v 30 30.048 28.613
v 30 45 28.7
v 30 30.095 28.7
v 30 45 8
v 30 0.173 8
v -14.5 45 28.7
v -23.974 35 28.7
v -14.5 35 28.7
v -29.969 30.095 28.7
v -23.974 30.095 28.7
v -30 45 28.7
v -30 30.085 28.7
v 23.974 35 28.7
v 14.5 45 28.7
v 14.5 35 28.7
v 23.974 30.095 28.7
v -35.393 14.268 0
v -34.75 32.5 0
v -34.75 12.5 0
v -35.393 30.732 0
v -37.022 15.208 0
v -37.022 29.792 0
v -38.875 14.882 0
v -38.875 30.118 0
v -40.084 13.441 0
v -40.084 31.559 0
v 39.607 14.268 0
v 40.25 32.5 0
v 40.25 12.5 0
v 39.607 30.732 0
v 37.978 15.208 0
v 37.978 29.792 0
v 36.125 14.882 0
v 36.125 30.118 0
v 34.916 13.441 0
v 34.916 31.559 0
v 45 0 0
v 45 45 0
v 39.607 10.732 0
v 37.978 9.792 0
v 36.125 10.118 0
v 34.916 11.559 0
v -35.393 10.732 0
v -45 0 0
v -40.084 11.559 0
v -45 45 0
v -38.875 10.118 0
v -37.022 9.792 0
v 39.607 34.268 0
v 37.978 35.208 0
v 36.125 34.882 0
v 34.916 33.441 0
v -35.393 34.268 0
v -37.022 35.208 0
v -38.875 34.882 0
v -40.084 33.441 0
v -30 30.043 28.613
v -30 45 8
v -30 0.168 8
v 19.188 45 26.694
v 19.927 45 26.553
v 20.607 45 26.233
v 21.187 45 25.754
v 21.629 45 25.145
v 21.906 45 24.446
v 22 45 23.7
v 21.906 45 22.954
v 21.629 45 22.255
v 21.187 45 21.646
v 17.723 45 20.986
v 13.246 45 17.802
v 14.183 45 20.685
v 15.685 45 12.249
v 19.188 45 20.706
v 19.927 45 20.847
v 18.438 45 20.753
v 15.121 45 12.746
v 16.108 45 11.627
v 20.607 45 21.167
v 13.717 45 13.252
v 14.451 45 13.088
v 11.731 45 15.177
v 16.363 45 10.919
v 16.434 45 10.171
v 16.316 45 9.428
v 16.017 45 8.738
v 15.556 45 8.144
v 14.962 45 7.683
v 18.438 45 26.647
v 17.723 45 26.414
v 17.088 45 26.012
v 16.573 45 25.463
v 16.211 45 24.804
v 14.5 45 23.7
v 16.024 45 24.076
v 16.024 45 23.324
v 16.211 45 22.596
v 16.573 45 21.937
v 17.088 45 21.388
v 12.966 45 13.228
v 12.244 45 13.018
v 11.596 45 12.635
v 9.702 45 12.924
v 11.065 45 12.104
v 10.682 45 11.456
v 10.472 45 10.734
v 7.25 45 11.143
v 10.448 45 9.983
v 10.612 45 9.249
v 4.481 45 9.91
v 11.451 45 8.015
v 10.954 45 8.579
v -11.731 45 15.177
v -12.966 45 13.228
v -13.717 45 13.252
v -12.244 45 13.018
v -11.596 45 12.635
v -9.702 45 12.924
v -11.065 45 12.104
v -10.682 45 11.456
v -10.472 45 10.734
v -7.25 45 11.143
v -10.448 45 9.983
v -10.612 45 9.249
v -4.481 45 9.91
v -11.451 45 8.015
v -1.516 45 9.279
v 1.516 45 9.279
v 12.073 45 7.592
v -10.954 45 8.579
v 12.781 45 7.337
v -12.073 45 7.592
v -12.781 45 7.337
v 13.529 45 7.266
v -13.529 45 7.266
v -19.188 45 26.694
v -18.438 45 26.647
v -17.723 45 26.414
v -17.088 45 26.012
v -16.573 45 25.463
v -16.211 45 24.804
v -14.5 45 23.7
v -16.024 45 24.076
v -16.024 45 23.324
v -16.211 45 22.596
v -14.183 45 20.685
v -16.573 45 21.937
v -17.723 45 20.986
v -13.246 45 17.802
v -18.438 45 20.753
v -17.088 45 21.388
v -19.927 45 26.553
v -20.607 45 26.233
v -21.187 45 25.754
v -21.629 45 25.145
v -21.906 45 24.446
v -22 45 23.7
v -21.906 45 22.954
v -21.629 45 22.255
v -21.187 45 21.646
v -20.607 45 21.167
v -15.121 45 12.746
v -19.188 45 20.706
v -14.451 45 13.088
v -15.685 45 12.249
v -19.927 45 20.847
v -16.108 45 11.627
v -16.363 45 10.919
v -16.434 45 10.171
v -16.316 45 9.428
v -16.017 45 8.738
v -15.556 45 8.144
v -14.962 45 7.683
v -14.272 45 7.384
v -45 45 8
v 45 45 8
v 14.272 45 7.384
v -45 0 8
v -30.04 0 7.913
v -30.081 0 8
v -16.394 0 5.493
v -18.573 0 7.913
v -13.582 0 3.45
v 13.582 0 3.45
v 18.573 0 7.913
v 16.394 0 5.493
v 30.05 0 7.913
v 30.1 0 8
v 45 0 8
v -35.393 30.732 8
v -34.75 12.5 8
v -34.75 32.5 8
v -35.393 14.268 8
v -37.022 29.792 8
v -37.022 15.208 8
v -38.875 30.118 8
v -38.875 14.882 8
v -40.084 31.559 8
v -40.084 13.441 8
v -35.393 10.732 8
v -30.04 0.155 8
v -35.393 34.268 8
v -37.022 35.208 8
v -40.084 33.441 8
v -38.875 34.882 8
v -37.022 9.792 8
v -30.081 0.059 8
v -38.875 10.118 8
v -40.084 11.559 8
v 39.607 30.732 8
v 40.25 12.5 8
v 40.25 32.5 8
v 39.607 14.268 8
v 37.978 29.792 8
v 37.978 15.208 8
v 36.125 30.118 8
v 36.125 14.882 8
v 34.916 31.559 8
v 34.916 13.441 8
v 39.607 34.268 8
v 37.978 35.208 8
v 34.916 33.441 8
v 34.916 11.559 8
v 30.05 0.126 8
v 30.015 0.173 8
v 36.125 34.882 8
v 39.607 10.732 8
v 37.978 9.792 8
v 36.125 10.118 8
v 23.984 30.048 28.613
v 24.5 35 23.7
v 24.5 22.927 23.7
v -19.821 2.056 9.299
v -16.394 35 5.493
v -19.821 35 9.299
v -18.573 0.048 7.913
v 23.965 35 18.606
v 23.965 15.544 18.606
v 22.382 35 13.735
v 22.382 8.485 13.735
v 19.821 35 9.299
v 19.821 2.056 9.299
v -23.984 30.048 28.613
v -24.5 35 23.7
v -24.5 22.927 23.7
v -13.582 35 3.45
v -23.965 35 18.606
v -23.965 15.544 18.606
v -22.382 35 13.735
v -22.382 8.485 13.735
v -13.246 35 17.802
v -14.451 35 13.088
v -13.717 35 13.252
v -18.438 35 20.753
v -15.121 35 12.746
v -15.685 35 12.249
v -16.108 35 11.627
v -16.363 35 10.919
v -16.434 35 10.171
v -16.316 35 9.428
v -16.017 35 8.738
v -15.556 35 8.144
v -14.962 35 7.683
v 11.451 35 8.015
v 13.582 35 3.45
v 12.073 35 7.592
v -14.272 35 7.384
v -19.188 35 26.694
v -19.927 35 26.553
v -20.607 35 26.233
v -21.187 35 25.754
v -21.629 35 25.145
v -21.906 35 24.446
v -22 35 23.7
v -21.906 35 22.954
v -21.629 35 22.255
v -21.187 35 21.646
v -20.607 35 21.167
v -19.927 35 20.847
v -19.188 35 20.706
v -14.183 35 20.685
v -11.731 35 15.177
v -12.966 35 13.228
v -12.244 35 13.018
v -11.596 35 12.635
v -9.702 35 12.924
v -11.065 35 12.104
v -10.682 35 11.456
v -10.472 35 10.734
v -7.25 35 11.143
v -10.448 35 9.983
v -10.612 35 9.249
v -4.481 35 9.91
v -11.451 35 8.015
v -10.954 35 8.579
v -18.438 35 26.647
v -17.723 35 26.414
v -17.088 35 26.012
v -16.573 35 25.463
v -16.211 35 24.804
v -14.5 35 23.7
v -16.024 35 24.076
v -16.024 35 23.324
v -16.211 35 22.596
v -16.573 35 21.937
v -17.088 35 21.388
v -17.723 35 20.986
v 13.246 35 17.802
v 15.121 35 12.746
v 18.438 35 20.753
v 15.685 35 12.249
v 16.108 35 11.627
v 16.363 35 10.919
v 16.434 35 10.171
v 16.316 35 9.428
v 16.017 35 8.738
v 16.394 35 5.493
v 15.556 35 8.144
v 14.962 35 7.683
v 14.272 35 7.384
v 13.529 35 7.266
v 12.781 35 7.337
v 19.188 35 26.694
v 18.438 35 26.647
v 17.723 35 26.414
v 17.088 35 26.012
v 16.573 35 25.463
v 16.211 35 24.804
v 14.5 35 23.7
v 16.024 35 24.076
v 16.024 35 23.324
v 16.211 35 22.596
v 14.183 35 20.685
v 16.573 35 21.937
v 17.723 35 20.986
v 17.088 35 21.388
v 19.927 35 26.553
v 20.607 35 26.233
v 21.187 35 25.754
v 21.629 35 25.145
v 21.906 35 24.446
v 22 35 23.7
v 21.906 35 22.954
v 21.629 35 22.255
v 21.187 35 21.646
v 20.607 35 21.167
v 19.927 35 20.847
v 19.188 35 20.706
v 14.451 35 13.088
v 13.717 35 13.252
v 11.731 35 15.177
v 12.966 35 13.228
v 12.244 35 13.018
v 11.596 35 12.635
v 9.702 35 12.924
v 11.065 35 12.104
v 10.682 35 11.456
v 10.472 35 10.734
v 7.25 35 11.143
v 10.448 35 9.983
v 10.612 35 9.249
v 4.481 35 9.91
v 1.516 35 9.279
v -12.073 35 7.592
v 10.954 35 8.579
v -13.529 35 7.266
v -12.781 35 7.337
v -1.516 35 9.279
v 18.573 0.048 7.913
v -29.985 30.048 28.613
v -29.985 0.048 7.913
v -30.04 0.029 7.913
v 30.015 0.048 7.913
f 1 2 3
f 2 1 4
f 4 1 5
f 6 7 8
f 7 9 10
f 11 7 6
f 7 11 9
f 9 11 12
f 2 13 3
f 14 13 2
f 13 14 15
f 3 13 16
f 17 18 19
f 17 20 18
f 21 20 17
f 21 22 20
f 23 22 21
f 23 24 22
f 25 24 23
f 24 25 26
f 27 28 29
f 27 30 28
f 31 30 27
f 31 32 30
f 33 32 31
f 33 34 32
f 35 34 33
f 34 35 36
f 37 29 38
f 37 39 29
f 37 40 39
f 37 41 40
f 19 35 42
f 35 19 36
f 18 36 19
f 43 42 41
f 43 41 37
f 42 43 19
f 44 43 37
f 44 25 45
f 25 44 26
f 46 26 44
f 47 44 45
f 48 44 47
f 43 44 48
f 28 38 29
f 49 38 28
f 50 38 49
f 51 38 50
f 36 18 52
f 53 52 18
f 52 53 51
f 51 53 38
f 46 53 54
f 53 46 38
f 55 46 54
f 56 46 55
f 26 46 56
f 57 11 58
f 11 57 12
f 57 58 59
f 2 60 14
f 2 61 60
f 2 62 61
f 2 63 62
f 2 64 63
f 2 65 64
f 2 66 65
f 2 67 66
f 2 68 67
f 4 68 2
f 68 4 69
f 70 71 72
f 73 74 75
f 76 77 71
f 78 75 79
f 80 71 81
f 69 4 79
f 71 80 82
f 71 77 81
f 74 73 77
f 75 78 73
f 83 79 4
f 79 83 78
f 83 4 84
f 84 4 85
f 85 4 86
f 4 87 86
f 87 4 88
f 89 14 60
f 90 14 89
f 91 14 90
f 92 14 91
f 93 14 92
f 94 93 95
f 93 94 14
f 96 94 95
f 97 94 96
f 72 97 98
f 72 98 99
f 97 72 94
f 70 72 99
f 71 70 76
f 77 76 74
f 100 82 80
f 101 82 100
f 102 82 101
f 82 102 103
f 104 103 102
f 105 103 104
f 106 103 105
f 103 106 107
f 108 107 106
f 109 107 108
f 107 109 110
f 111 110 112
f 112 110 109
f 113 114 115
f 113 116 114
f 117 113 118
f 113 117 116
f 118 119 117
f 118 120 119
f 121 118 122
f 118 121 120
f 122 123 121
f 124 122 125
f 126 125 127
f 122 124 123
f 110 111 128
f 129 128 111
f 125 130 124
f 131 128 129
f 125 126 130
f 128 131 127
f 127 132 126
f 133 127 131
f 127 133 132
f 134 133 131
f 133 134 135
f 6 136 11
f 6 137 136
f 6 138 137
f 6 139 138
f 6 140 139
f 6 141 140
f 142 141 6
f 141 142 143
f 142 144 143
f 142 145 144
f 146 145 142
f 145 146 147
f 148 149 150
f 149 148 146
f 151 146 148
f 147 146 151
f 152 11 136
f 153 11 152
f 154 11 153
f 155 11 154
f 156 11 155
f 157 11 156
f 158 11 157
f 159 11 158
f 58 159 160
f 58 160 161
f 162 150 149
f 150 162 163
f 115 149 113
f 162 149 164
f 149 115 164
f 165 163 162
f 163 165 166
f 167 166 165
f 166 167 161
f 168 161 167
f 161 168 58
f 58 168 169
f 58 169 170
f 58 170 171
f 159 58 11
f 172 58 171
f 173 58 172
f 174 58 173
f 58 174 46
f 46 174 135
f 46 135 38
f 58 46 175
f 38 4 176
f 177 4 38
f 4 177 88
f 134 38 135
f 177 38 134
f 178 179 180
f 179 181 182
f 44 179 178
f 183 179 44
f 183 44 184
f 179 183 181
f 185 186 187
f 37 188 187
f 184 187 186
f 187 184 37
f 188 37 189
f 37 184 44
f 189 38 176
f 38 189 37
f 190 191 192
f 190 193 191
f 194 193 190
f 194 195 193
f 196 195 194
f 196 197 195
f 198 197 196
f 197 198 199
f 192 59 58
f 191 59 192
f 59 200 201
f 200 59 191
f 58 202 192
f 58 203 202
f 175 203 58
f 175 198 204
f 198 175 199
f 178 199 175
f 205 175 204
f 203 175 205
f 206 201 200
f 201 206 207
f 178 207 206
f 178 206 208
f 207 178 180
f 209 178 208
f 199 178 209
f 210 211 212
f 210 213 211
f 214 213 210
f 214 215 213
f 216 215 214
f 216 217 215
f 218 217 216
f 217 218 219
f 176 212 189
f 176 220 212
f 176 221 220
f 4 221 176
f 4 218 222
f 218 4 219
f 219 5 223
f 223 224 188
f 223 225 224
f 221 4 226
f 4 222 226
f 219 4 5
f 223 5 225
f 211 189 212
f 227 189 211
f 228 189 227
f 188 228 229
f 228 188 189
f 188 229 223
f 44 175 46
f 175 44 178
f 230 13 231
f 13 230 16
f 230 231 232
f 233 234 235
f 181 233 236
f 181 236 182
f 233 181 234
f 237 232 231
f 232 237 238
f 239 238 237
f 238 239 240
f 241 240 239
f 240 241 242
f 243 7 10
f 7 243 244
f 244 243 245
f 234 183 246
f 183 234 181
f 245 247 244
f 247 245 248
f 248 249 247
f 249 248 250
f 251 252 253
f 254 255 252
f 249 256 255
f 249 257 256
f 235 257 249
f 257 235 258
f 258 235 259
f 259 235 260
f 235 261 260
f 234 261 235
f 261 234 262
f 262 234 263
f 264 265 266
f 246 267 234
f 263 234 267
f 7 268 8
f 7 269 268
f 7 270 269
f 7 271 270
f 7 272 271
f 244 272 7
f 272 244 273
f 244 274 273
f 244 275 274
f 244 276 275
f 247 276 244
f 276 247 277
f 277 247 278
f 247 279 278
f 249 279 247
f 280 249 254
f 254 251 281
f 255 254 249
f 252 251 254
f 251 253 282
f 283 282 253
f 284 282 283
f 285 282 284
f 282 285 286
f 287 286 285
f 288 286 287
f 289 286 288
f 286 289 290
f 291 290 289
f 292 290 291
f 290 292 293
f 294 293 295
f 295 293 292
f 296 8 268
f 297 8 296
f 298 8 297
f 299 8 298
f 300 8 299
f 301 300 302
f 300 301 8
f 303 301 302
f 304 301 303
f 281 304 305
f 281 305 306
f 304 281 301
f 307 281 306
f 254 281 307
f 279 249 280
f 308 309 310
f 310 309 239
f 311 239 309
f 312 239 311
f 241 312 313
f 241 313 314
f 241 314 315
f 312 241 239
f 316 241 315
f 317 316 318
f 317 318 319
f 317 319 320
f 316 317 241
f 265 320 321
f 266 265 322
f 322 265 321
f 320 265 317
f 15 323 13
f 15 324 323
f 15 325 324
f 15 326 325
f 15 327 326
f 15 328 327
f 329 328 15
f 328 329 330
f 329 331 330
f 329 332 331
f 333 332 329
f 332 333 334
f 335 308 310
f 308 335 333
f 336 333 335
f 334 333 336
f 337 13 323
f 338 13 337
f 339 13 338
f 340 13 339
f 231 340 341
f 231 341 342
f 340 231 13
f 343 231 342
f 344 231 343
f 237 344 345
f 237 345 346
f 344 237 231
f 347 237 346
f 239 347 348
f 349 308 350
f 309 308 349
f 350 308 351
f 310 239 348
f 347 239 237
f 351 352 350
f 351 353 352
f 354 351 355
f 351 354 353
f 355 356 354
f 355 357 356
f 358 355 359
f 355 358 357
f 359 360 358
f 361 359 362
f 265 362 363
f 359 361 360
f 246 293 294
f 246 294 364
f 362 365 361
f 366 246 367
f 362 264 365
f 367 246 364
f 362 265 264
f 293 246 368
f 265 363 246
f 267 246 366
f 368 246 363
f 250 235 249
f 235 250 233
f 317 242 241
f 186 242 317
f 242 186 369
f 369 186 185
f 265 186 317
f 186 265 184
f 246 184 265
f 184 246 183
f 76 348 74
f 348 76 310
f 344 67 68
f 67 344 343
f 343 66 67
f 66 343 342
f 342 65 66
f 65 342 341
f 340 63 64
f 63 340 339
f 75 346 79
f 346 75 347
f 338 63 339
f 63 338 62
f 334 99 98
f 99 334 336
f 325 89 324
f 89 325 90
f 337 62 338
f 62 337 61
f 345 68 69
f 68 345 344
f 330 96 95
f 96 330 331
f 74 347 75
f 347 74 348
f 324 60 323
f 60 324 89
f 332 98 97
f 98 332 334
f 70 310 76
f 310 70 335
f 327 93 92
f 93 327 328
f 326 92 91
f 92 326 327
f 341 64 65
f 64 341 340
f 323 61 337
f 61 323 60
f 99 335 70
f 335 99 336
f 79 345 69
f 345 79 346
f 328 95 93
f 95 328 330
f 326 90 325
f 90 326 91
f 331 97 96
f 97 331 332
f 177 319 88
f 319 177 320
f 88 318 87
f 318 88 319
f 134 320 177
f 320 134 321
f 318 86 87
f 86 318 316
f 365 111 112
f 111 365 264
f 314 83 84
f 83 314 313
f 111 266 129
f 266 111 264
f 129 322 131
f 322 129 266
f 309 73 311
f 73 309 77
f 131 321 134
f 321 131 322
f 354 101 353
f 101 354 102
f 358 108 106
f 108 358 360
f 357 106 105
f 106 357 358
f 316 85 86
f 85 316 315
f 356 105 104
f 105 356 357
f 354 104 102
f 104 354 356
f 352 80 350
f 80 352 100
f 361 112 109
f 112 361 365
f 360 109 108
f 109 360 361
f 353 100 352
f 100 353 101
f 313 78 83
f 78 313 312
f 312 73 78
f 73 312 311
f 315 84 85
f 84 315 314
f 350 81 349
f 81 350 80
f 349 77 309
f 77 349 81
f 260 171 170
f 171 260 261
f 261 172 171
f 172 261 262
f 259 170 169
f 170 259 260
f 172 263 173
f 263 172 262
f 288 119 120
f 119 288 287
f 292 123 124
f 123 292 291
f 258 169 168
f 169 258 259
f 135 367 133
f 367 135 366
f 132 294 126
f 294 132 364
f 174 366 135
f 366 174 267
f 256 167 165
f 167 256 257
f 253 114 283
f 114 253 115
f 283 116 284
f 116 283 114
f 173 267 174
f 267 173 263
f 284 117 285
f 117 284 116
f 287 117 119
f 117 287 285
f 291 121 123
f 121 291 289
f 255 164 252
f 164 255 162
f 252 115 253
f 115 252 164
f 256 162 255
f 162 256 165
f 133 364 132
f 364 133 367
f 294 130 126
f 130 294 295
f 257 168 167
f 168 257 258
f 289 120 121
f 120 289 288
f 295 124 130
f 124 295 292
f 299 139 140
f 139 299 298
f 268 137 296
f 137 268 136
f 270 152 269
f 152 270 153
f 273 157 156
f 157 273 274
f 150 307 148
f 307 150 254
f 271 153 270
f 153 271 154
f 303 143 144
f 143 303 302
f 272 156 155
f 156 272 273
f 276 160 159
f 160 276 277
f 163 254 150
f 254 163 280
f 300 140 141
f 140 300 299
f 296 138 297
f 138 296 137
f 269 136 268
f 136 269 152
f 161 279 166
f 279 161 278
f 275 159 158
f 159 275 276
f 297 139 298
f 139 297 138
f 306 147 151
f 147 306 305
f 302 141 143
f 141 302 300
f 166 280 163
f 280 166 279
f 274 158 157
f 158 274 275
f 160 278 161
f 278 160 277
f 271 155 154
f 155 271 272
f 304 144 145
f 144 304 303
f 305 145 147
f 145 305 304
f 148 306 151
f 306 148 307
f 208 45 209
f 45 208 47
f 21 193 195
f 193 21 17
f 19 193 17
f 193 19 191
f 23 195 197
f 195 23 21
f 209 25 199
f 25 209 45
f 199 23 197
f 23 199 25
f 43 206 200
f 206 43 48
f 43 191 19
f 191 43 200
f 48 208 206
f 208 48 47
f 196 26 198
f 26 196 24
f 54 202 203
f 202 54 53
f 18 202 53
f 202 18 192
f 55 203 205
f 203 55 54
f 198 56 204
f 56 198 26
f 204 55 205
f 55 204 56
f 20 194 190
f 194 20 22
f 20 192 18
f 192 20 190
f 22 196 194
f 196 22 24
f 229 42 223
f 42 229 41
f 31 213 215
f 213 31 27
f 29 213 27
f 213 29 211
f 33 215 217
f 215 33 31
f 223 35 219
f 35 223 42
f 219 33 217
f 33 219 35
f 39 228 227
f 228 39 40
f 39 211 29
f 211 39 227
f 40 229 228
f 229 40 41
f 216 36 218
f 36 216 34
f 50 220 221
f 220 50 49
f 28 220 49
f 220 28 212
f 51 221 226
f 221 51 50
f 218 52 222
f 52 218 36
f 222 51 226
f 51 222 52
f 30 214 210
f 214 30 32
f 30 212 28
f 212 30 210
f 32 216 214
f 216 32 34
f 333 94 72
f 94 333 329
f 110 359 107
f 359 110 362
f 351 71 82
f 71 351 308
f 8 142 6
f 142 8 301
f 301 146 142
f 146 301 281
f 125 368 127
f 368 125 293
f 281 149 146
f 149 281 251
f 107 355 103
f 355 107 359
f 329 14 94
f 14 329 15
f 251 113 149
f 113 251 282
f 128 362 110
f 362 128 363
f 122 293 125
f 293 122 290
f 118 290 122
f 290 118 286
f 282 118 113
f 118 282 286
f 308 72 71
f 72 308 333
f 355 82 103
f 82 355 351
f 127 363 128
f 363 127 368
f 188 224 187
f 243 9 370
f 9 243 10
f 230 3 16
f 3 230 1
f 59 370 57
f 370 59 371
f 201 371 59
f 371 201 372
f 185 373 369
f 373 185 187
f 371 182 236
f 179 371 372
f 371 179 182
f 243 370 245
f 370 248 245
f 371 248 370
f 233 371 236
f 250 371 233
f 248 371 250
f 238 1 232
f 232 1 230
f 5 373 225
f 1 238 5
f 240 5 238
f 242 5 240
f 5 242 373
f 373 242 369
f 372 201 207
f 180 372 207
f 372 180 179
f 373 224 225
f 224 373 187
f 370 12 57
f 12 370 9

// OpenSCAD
/**
 * 
 * CNC Router Y Carriage
 * 
 * Designed by Diego Viejo
 * Created on 20/Jan/2015
 * Last modified 17/Feb/2015
 * 
 */

//ball bearing bolt measurements
outerRad = 48 / 2;
holeRad = 38 / 2;
mainBodyRad = 28 / 2;

mainBodyLength = 45;

plateHeight = 8;
mainBodyHeigh = 1.7 + mainBodyRad + plateHeight;

// T-Slot measurements 
slotDist = 20;
slotWidth = 20*3;

width = slotWidth+30;

module roulette(localHeight=8)
{
  for(r=[-45, 0, 45, 135, 180, 225])
    rotate(r)
      translate([holeRad, 0, -1]) 
	cylinder(r=3, h=localHeight, $fn=25);
}

module carriageBody()
{
  translate([-slotWidth/2, 0, 0]) cube([slotWidth, mainBodyLength, mainBodyHeigh+5]);
  translate([-width/2, 0, 0]) cube([width, mainBodyLength, plateHeight]);
}

module carriageHoles()
{
  translate([0, mainBodyLength+5, mainBodyHeigh])
    rotate([90, 0, 0]) hull()
    {
      cylinder(r=mainBodyRad+0.5, h=30);
      translate([0, mainBodyRad, 0])
	cylinder(r=mainBodyRad+0.5, h=30);
    }

  translate([0, mainBodyLength-10, mainBodyHeigh])
    rotate([90, 0, 0]) 
      intersection()
      {
	cylinder(r=outerRad+0.5, h=mainBodyLength-10+1);
	cube([100, outerRad*2 - 8+0.5, 100], center=true);
      }

  translate([0, mainBodyLength-mainBodyLength/3, mainBodyHeigh])
    rotate([-90, 0, 0])
      roulette(mainBodyLength/3+2);
  
  // T-Slot bolt holes and cap holes
  for(i=[-1, 1]) 
  {
    for(j=[-1, 1]) 
    {
      translate([i*(slotWidth+15)/2, mainBodyLength/2+slotDist*j/2, -1])
	cylinder(r=2.5+0.25, h=mainBodyHeigh+2);
    }
  }
        
  //fancy cut out
  hull()
  {
    for(i=[-1, 1]) 
    {
      translate([i*slotWidth/2, mainBodyLength*2/3, mainBodyHeigh+5]) sphere(r=0.1);
      translate([i*slotWidth/2, 0, mainBodyHeigh+5]) sphere(r=0.1);
      translate([i*slotWidth/2, 0, plateHeight]) sphere(r=0.1);
    }
  }
}

module rodNutCarriage()
{
  difference()
  {
    carriageBody();
    carriageHoles();
  }
}

module chained_hull()
{
  for(i=[0:$children-2])
   hull()
   {
     children(i);
     children(i+1);
   }
}

// Helper module: centered cube on (X,Y) but not on Z, like cylinder
module centered_cube(size)
{
  translate([-size[0]/2, -size[1]/2, 0])
    cube(size);
}


rad = 3;
height=20;
displacement = 25;

module yPlate()
{
  difference()
  {
    leg();
    
    hull()
    {
      translate([slotWidth+displacement/2+rad/2, -mainBodyLength/2, -5]) cylinder(r=mainBodyLength/4, h=30);
      translate([slotWidth+displacement, -mainBodyLength/2, -5]) cylinder(r=mainBodyLength/4, h=30);
    }
    
    for(i=[-1, 1])
    {
      translate([slotWidth+displacement/3, -mainBodyLength/2+i*mainBodyLength/3, -5]) cylinder(r=1.7, h=30);
      translate([slotWidth+displacement/3, -mainBodyLength/2+i*mainBodyLength/3, -5]) cylinder(r=3.2, h=18);
    }
    translate([-slotWidth-displacement/3, -mainBodyLength/2	, -5]) cylinder(r=1.7, h=30);
    translate([-slotWidth-displacement/3, -mainBodyLength/2, -5]) cylinder(r=3.2, h=18);
    
      // T-Slot bolt holes and cap holes
  #for(i=[-1, 1]) 
  {
    for(j=[-1, 1]) 
    {
      translate([i*(slotWidth+15)/2, -mainBodyLength/2+slotDist*j, -5])
	cylinder(r=2.5+0.25, h=mainBodyHeigh+2);
    }
  }

  }
}

//module leg. 
module leg()
{
  rotate([90, 0, 0]) chained_hull()
  {
    translate([-slotWidth-displacement/3+rad, height-rad, mainBodyLength/3]) cylinder(r=rad, h=mainBodyLength/3);
    translate([-slotWidth-displacement+rad, height-rad, mainBodyLength/3]) cylinder(r=rad, h=mainBodyLength/3);
    translate([-slotWidth, 0, 0]) cylinder(r=rad, h=mainBodyLength);

    translate([slotWidth, 0, 0]) cylinder(r=rad, h=mainBodyLength);
    translate([slotWidth+displacement-rad, height-rad, 0]) cylinder(r=rad, h=mainBodyLength);
    translate([slotWidth+displacement/3-rad, height-rad, 0]) cylinder(r=rad, h=mainBodyLength);
  }
}

rodNutCarriage();

*translate([0, -50, 0]) 
  yPlate();
